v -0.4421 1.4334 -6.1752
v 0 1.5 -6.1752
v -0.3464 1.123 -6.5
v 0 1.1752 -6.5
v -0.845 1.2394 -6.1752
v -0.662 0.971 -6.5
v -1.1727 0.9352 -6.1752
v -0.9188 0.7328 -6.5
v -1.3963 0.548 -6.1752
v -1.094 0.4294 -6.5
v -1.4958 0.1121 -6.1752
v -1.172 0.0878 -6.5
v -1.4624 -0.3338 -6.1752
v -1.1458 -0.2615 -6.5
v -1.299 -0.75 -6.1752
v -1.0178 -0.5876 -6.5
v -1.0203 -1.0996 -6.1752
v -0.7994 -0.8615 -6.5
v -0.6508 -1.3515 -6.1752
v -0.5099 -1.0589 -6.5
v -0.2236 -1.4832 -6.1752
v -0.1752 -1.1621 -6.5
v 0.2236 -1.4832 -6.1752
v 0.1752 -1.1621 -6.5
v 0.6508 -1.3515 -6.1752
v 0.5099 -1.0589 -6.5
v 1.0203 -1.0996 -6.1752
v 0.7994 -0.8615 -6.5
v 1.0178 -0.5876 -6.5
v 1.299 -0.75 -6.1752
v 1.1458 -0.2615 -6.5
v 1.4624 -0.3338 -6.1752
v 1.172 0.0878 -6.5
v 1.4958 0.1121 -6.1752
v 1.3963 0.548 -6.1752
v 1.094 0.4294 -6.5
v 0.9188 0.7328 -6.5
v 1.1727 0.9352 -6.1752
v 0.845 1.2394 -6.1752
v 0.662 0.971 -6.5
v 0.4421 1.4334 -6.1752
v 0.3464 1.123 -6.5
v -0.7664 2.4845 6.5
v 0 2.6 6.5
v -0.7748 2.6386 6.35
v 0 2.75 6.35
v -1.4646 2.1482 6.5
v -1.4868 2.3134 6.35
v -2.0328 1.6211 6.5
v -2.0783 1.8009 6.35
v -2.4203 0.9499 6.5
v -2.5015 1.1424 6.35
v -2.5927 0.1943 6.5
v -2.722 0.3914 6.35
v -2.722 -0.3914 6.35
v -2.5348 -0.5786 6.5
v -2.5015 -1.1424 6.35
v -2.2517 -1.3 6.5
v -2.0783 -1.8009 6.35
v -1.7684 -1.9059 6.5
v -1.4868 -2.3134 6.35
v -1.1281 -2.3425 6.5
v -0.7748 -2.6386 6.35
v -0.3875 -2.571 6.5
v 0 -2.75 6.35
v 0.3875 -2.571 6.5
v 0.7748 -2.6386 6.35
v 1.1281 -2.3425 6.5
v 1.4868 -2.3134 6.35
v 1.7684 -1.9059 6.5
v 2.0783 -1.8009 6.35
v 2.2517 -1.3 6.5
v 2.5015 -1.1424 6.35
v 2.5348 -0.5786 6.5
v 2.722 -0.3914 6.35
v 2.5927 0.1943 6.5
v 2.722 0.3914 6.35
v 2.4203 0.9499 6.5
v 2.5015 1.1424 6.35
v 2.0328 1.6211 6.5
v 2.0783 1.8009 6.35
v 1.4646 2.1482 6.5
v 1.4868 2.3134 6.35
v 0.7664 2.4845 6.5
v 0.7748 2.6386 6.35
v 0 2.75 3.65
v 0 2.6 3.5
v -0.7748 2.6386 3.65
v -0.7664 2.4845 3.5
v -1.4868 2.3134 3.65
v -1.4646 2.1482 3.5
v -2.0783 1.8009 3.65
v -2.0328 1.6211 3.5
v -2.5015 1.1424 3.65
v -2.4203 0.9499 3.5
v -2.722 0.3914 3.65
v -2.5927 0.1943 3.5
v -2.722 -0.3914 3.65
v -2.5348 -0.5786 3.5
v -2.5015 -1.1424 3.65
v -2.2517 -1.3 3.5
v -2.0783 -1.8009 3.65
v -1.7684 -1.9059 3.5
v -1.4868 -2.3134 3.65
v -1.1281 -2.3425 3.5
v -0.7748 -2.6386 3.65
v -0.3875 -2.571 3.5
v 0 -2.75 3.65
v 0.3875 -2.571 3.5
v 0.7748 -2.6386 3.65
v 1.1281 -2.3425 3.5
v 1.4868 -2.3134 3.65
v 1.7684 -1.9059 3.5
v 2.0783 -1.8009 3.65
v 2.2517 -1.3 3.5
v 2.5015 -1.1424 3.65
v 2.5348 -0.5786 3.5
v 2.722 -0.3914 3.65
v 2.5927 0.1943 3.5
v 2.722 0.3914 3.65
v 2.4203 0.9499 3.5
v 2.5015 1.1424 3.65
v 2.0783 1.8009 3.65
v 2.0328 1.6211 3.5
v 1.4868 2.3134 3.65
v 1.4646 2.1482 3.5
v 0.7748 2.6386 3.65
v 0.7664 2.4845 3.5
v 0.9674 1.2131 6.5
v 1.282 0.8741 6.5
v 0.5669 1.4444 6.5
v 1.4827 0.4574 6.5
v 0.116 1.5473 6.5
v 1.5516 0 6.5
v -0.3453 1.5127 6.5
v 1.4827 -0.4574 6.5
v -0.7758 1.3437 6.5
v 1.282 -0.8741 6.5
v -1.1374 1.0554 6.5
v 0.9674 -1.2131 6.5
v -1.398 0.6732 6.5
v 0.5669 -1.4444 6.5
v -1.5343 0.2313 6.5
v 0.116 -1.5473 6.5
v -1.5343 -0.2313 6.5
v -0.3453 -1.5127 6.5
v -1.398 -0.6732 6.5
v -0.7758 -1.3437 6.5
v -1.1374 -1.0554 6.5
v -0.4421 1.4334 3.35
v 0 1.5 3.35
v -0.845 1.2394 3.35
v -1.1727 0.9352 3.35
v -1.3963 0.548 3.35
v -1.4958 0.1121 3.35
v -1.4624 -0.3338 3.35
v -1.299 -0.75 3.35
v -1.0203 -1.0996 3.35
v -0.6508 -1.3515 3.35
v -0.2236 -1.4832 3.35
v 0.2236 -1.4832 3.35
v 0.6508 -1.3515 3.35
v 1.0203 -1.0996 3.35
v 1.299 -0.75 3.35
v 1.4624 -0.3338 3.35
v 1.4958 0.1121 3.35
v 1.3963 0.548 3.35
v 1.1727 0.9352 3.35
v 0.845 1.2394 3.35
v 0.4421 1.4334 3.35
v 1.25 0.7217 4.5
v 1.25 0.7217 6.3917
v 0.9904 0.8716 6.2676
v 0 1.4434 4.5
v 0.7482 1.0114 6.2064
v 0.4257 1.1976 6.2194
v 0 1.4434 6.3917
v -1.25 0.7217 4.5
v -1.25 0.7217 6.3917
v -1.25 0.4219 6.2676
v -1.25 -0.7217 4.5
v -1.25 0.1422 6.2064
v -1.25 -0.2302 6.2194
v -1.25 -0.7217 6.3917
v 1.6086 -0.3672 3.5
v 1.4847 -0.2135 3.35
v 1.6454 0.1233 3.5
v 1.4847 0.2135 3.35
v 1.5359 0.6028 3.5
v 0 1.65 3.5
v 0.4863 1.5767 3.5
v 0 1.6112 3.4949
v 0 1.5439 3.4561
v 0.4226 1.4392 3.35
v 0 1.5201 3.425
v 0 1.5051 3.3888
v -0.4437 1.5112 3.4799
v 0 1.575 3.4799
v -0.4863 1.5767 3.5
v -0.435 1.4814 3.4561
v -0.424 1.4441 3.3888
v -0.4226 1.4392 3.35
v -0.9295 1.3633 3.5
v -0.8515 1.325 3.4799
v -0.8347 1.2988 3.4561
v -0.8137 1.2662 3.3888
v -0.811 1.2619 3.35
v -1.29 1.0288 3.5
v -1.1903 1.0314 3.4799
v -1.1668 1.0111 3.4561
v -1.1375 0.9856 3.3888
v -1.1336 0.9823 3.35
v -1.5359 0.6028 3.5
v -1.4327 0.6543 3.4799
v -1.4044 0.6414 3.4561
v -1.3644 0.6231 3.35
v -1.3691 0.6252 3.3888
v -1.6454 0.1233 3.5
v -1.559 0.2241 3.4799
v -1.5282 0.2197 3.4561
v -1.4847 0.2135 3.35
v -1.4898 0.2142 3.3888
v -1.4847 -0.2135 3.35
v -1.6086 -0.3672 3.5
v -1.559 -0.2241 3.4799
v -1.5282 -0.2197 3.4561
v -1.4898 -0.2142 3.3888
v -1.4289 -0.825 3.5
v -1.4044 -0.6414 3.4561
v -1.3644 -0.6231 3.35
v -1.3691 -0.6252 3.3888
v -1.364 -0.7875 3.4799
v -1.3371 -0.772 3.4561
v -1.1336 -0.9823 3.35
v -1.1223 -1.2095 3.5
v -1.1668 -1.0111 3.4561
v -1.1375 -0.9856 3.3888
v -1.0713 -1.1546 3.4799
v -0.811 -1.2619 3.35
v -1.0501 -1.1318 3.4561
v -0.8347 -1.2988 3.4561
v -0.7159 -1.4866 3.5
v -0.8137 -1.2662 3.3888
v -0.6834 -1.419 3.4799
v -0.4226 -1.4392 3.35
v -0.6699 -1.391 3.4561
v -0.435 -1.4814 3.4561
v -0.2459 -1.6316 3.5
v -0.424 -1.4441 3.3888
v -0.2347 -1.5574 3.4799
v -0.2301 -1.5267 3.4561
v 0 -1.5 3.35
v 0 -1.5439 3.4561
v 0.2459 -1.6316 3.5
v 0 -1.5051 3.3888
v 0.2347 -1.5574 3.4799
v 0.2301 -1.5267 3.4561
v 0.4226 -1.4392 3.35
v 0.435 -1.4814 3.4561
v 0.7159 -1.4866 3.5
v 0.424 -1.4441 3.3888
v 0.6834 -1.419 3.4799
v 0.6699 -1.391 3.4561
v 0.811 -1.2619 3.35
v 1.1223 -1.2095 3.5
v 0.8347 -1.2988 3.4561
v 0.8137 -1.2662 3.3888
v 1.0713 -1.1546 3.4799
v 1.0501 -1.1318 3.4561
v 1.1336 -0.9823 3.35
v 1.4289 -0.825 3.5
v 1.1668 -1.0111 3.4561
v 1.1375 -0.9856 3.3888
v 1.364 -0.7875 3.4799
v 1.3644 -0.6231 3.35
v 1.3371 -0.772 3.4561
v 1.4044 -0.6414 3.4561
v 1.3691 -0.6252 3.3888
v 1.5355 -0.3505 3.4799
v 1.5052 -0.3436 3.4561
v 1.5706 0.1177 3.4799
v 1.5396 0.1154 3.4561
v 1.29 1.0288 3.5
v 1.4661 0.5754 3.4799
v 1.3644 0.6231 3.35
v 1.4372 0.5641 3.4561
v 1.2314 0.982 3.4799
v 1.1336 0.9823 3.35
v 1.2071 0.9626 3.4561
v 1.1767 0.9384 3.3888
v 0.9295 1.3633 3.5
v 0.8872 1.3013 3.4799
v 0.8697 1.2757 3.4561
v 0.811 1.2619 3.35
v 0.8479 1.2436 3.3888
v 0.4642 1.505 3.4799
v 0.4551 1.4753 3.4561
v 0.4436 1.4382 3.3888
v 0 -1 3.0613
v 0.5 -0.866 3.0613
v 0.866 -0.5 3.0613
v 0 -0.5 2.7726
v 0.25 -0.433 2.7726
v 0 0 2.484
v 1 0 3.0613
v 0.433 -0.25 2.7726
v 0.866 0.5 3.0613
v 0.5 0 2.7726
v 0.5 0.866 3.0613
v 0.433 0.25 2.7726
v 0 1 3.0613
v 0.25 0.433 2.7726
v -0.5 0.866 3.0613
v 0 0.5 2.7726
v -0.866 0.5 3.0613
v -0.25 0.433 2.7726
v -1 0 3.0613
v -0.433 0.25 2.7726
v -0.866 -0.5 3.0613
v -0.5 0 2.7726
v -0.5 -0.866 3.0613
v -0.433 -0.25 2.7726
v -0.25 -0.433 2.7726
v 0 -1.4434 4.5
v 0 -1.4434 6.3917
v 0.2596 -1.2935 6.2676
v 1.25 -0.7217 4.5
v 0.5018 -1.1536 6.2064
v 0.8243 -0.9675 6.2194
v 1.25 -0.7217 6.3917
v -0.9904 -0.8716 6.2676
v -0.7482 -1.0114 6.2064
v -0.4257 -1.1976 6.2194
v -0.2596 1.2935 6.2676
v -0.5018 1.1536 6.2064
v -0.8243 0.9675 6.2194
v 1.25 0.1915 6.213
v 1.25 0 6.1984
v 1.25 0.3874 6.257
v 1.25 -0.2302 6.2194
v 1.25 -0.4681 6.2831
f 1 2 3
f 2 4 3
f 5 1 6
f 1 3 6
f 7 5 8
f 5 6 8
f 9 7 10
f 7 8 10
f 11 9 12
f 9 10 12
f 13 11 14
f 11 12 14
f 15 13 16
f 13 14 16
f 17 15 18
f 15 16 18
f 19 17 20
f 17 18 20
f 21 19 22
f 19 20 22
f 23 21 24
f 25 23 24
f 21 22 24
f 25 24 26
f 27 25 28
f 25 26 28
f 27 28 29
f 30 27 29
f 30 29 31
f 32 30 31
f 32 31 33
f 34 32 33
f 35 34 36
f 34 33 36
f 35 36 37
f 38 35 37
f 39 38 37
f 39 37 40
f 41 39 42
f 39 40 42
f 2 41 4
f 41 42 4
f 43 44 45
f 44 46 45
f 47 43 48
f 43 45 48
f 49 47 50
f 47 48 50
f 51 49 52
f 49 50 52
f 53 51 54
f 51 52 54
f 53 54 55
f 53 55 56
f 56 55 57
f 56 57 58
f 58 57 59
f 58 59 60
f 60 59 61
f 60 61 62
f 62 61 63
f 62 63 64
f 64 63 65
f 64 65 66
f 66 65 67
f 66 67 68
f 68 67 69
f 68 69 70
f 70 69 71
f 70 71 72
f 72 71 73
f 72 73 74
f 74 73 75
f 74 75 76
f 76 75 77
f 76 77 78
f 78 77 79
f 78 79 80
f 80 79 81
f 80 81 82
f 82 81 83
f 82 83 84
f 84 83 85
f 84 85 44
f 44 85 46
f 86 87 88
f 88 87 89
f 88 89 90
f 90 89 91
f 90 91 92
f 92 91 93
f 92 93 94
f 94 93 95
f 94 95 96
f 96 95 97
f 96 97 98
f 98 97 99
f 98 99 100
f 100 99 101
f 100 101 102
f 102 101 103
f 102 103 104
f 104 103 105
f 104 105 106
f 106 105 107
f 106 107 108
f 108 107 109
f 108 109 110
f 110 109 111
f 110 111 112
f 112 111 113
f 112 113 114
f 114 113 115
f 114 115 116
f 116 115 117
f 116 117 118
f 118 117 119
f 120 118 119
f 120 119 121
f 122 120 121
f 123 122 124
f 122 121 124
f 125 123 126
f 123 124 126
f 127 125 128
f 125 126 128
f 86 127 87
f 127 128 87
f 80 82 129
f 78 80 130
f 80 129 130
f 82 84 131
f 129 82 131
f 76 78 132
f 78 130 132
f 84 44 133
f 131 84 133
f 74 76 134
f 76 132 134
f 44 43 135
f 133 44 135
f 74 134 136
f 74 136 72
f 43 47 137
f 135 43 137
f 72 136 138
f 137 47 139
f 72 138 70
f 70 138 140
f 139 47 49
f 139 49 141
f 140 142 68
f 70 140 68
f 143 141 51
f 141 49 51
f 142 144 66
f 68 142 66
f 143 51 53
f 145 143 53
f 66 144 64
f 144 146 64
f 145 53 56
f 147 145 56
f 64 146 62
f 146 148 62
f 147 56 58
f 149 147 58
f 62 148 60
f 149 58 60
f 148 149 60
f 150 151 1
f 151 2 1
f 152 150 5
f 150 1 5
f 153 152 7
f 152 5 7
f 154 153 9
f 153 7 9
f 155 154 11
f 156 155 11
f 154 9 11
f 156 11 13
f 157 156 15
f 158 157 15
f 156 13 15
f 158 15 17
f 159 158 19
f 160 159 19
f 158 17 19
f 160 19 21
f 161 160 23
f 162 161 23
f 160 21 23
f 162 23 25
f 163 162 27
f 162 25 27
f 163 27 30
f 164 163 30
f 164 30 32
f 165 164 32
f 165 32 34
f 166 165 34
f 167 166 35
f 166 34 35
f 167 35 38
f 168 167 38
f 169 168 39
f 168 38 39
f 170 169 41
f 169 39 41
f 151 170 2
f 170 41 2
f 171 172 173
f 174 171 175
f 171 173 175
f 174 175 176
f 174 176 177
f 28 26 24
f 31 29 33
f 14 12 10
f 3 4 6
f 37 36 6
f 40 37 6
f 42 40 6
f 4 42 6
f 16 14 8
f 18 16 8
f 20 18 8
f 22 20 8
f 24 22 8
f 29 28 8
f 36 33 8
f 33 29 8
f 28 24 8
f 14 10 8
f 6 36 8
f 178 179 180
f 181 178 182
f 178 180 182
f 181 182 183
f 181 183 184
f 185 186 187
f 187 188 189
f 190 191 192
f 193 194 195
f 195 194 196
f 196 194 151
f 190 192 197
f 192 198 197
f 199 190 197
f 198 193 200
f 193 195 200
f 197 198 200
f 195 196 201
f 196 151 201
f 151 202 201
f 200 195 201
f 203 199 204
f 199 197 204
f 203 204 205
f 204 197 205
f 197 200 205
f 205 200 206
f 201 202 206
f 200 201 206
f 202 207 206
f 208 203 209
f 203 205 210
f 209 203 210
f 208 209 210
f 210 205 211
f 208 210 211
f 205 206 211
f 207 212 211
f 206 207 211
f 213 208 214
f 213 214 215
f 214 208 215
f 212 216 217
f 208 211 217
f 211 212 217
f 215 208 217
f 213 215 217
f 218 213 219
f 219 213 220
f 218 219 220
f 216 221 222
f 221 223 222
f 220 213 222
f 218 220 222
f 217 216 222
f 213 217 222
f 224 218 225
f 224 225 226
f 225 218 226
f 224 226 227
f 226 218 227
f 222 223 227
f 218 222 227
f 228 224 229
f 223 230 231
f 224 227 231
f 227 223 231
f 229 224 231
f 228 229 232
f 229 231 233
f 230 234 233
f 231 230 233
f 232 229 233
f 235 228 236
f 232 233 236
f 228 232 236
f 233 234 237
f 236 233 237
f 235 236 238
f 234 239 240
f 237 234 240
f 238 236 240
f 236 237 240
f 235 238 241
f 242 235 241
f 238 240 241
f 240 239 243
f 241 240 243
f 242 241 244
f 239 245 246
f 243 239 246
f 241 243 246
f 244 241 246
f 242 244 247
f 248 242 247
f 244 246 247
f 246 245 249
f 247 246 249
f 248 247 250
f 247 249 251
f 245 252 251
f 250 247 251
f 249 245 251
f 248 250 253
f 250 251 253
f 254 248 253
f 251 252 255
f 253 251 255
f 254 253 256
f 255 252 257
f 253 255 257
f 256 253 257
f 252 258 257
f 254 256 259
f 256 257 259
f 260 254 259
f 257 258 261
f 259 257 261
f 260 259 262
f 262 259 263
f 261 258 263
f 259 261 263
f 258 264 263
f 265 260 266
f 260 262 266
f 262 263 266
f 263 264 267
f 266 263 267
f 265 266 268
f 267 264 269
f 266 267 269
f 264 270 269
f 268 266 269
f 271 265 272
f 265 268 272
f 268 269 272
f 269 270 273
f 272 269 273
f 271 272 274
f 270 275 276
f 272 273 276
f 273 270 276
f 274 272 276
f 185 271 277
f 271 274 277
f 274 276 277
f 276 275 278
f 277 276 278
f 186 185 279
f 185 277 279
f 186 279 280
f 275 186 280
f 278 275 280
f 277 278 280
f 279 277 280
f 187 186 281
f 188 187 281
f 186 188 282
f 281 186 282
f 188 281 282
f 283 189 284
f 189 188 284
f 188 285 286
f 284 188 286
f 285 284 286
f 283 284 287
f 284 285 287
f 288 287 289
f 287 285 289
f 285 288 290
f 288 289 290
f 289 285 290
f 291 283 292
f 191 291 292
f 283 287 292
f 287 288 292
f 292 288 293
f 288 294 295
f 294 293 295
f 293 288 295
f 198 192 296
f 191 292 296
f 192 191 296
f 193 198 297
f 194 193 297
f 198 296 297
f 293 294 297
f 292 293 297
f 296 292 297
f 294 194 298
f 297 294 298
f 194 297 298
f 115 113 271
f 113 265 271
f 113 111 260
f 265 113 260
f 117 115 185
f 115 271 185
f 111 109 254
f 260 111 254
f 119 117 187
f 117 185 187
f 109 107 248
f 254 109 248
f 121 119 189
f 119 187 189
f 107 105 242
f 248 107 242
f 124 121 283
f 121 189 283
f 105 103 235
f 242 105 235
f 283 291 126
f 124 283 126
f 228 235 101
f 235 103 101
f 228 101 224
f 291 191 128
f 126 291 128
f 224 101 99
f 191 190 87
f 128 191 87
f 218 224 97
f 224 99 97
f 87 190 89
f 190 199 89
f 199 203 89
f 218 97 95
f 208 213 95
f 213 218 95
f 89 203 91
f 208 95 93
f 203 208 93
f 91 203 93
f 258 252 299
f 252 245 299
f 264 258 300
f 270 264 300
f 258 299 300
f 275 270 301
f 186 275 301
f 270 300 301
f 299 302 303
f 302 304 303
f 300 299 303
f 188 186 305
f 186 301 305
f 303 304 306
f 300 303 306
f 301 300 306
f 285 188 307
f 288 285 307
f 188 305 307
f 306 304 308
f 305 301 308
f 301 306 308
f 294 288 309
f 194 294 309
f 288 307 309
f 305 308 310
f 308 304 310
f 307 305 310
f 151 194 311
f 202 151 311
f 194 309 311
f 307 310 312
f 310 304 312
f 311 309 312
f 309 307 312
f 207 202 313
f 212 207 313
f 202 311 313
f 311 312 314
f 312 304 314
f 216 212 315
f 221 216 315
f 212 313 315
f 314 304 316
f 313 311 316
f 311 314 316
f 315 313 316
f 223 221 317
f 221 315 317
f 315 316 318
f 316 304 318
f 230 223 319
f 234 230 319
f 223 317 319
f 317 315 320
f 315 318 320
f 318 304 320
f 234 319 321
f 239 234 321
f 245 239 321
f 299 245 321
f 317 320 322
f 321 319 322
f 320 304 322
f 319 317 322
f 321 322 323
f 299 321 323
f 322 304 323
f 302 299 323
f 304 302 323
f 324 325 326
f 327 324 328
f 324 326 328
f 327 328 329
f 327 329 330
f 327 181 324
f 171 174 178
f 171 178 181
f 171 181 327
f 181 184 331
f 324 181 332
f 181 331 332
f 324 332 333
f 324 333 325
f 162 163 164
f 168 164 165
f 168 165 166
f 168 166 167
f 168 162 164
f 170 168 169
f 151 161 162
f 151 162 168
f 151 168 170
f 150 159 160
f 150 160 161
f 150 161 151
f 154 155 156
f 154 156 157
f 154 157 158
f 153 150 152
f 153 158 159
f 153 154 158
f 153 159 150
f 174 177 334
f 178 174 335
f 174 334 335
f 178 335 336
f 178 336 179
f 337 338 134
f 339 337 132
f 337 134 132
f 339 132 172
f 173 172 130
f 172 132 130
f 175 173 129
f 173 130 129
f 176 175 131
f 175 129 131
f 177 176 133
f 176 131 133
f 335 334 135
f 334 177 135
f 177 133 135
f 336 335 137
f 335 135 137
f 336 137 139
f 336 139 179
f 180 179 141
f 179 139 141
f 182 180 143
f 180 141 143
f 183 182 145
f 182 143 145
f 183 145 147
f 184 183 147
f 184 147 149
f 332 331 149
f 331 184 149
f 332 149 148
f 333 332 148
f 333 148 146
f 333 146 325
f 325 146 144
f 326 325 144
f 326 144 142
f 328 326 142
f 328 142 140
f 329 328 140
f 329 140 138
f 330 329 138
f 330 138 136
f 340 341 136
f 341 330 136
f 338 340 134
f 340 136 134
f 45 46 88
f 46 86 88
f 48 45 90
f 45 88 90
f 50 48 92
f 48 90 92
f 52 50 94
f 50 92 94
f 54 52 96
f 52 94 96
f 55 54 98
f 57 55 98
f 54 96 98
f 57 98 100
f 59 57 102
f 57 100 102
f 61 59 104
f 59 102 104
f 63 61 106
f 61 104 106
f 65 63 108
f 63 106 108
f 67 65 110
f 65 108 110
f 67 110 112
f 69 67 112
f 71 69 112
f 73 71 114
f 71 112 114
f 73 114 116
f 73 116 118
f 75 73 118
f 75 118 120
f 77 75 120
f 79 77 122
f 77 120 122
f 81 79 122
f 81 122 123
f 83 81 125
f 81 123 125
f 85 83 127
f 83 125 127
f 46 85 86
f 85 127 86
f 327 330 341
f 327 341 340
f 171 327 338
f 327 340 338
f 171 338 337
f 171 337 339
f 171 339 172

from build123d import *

# Parameters (mm, degrees)
CUT_EXTRUDE1_DEPTH     = 2
SKETCH4_R              = 1.551628848
CUT_EXTRUDE2_DEPTH     = 1.5
CUT_EXTRUDE2_DRAFT     = -45
SPLIT1_SURFACE_1_BACK  = 16.149
SPLIT1_SURFACE_1_DEPTH = 32.298
SPLIT1_SURFACE_2_BACK  = 16.149
SPLIT1_SURFACE_2_DEPTH = 32.298


with BuildPart() as part:
    # Sketch2 → Revolve1 (revolve)
    with BuildSketch(Plane(origin=(0, 0, 0), x_dir=(0, 0, -1), z_dir=(1, 0, 0))):
        with BuildLine():
            Line((-6.5, 0), (-6.5, 2.6))
            Line((-6.5, 2.6), (-6.35, 2.75))
            Line((-6.35, 2.75), (-3.65, 2.75))
            Line((-3.65, 2.75), (-3.5, 2.6))
            Line((-3.5, 2.6), (-3.5, 1.65))
            ThreePointArc((-3.5, 1.65), (-3.456066017, 1.543933983), (-3.35, 1.5))
            Line((-3.35, 1.5), (6.175240474, 1.5))
            Line((6.175240474, 1.5), (6.5, 1.175240474))
            Line((6.5, 1.175240474), (6.5, 0))
            Line((6.5, 0), (-6.5, 0))
        make_face()
    revolve(axis=Axis((0, 0, -6.5), (0, 0, 1)))

    # Sketch3 → Cut-Extrude1 (cut)
    with BuildSketch(Plane.XY.offset(6.5)):
        Polygon((1.25, -0.721687836), (1.25, 0.721687836), (0, 1.443375673), (-1.25, 0.721687836), (-1.25, -0.721687836), (0, -1.443375673), align=None)
    extrude(amount=-CUT_EXTRUDE1_DEPTH, mode=Mode.SUBTRACT)


with BuildPart() as cut_extrude2_tool:
    # Sketch4 → Cut-Extrude2 (with draft: the straight prism first)
    with BuildSketch(Plane.XY.offset(6.5)):
        Circle(SKETCH4_R)
    extrude(amount=-CUT_EXTRUDE2_DEPTH)
    # Cut-Extrude2: the draft: its side faces are tilted about the plane it starts from
    cut_extrude2_sides = [cut_extrude2_tool.faces().sort_by_distance(p)[0] for p in [
        (-1.551628848, 0, 5.75),
    ]]
    draft(cut_extrude2_sides, Plane.XY.offset(6.5), CUT_EXTRUDE2_DRAFT)


with BuildPart() as part_1:
    add(part.part)

    # Cut-Extrude2: cut by cut_extrude2_tool
    add(cut_extrude2_tool.part, mode=Mode.SUBTRACT)


with BuildPart() as body_2:
    # Split1: the piece behind the surface
    add(part_1.part)
    # Split1 surface: a surface, the sketch's curves swept straight by 32.298 mm
    with BuildLine(Plane(origin=(0, 0, 0), x_dir=(0, 0, -1), z_dir=(1, 0, 0)).offset(-SPLIT1_SURFACE_1_BACK), mode=Mode.PRIVATE) as split1_surface_1_path:
        Line((-3.35, -2.75), (-3.35, 2.75))
    split1_surface_1 = Shell.extrude(split1_surface_1_path.wire(), (1 * SPLIT1_SURFACE_1_DEPTH, 0 * SPLIT1_SURFACE_1_DEPTH, 0 * SPLIT1_SURFACE_1_DEPTH))
    split(bisect_by=split1_surface_1, keep=Keep.BOTTOM)


with BuildPart() as part_2:
    add(part_1.part)

    # Split1: split by a surface, the side it looks to stays
    # Split1 surface: a surface, the sketch's curves swept straight by 32.298 mm
    with BuildLine(Plane(origin=(0, 0, 0), x_dir=(0, 0, -1), z_dir=(1, 0, 0)).offset(-SPLIT1_SURFACE_2_BACK), mode=Mode.PRIVATE) as split1_surface_2_path:
        Line((-3.35, -2.75), (-3.35, 2.75))
    split1_surface_2 = Shell.extrude(split1_surface_2_path.wire(), (1 * SPLIT1_SURFACE_2_DEPTH, 0 * SPLIT1_SURFACE_2_DEPTH, 0 * SPLIT1_SURFACE_2_DEPTH))
    split(bisect_by=split1_surface_2, keep=Keep.TOP)

    # Sketch8 → Revolve2 (revolve)
    with BuildSketch(Plane(origin=(0, 0, 0), x_dir=(0, 0, -1), z_dir=(1, 0, 0)), mode=Mode.PRIVATE) as revolve2_sk:
        Polygon((-3.5, 0), (-3.5, 1.5), (-3.35, 1.5), (-2.483974596, 0), align=None)
    revolve(revolve2_sk.sketch.rotate(Axis((0, 0, 2.483974596), (0, 0, 1)), 180), axis=Axis((0, 0, 2.483974596), (0, 0, 1)))


solid = Compound([body_2.part, part_2.part])
